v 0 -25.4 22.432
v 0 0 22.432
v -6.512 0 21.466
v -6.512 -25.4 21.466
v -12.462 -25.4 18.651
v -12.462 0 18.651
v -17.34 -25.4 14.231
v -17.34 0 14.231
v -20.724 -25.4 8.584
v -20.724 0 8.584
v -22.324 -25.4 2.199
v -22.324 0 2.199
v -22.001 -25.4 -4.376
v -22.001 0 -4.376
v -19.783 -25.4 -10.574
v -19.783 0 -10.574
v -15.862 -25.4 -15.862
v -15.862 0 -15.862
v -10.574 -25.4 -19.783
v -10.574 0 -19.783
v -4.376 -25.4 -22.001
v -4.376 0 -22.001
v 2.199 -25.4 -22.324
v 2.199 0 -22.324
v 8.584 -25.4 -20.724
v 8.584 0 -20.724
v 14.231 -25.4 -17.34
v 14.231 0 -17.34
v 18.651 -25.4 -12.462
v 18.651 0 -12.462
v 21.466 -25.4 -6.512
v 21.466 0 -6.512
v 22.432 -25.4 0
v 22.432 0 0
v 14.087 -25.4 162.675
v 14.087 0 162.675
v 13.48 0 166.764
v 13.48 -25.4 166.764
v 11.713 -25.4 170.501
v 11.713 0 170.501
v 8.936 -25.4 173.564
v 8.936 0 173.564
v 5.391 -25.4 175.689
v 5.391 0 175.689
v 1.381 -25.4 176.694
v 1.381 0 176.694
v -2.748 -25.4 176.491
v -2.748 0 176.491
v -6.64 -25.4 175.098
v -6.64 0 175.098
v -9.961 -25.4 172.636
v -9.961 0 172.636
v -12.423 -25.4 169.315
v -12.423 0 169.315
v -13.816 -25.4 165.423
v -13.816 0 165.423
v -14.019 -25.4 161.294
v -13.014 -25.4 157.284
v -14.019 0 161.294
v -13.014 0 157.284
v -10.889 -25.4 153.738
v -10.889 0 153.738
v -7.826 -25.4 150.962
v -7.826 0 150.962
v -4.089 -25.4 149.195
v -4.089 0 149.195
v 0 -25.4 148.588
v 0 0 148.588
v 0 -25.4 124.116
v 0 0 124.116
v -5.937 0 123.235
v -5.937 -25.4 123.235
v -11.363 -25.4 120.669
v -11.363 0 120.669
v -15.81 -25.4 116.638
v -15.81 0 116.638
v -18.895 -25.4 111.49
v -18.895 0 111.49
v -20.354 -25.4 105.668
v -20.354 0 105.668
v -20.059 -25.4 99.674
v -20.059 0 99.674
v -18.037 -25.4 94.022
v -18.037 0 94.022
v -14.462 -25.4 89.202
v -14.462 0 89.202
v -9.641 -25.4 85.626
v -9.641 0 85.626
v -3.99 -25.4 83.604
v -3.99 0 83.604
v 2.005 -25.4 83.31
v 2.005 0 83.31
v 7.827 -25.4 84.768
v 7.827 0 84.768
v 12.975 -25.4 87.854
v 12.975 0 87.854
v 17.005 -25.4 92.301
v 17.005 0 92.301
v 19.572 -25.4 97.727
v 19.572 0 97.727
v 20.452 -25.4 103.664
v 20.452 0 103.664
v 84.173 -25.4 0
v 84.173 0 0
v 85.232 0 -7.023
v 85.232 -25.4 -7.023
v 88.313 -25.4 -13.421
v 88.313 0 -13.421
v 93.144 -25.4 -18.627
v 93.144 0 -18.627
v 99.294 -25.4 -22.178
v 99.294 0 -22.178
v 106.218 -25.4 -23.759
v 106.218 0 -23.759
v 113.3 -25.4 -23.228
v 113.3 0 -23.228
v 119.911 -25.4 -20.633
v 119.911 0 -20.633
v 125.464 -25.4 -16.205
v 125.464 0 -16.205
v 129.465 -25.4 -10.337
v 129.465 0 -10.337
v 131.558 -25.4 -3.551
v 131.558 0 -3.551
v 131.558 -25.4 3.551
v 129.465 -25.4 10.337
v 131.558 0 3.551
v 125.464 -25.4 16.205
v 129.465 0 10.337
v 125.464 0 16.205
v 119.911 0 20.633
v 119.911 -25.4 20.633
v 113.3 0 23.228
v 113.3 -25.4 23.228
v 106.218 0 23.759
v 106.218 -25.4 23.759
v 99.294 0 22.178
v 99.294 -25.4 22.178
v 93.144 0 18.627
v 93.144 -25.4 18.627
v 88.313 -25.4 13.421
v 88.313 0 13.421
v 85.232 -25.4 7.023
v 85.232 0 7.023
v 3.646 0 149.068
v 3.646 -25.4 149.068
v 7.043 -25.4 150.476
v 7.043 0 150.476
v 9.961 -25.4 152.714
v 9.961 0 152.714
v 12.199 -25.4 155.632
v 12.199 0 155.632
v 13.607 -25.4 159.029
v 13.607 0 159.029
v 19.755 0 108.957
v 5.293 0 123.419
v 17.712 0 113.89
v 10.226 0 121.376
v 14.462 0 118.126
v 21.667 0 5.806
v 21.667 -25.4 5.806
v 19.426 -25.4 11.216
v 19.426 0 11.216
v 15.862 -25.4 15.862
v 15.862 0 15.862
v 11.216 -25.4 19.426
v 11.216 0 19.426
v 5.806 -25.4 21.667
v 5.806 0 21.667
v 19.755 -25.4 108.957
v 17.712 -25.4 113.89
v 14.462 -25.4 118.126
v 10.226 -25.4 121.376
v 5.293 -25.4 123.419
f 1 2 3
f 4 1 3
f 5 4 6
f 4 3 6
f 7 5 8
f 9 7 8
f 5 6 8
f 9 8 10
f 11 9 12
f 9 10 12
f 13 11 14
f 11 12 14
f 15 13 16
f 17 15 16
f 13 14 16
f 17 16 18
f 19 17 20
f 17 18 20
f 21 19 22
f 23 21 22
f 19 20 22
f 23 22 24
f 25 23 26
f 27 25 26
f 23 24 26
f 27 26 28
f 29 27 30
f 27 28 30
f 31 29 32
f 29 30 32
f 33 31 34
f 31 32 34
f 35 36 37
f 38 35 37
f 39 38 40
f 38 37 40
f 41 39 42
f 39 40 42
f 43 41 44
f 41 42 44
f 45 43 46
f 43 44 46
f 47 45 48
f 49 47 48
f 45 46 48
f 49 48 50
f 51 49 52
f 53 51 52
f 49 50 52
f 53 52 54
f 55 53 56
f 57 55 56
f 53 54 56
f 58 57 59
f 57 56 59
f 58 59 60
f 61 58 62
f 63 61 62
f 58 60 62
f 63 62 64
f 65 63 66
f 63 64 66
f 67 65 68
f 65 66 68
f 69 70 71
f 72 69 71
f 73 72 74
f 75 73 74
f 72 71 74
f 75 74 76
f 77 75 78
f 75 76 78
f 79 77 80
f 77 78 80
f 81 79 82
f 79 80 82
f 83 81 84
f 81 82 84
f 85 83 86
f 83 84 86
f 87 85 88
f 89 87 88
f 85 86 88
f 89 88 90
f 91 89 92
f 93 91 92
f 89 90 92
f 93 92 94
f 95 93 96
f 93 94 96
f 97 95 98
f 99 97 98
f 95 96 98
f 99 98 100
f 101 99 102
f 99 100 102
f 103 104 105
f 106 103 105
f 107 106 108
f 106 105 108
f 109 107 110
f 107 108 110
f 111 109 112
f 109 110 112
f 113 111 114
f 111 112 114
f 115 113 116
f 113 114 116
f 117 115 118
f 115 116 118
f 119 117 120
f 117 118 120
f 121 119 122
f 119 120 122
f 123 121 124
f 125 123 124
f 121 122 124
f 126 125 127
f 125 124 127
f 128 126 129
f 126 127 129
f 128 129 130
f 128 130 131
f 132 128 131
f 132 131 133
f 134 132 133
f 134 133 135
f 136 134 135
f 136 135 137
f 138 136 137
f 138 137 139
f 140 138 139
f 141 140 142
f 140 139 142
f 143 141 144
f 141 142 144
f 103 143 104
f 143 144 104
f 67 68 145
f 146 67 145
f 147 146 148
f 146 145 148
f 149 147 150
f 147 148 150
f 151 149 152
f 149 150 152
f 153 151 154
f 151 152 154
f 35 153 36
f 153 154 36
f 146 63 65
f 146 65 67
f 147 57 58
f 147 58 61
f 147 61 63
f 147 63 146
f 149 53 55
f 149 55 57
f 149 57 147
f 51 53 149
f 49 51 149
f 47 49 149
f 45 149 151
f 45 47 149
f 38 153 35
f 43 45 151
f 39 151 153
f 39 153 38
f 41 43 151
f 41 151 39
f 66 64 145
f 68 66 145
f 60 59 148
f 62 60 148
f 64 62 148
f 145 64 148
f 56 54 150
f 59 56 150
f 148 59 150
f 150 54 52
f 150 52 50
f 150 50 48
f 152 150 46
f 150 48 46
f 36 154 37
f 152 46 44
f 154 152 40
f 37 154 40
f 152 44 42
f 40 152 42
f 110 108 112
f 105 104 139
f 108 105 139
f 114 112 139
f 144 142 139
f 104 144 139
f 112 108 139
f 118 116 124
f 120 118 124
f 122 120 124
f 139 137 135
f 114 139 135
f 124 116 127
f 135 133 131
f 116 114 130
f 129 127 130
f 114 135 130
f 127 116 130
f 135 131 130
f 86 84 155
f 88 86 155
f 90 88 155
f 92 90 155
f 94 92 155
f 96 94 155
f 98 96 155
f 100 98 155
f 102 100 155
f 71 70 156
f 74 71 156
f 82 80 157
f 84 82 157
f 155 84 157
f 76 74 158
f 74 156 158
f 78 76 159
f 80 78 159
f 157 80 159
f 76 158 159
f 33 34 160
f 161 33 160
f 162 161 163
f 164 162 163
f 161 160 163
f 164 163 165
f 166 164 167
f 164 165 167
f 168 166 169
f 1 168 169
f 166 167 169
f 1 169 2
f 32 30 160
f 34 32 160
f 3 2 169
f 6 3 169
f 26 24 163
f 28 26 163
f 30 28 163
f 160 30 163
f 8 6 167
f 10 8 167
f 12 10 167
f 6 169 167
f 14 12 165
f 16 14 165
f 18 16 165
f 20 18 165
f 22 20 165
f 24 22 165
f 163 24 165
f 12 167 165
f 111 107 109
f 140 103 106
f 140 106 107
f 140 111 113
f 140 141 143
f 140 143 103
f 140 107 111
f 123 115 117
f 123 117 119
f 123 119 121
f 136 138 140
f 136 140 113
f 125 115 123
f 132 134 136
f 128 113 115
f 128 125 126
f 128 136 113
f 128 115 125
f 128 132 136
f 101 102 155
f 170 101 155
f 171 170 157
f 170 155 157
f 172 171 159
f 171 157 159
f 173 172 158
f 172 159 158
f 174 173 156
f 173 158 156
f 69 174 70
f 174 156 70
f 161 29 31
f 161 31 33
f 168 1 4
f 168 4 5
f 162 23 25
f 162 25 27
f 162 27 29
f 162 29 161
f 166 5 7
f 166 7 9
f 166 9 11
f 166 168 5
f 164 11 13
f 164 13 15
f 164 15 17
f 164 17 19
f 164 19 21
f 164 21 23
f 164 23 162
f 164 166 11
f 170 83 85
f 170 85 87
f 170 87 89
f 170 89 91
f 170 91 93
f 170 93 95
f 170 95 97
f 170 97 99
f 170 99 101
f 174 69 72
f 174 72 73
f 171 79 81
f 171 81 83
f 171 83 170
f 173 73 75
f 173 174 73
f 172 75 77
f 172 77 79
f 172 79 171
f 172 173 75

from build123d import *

# Parameters (mm, degrees)
F3_DEPTH = 25.4


# Not quite as in the source:
# - the program builds the solid bodies; features that only make, move or delete a surface that nothing else refers to are left out


with BuildPart() as f3:
    # F0 (on Front) → F3 (new body)
    with BuildSketch(Plane.XZ):
        with BuildLine():
            Line((22.4317827104, 0), (0, 0))
            Line((0, 0), (0, 22.4317827104))
            ThreePointArc((0, 22.4317827104), (-15.8616656686, -15.8616656686), (22.4317827104, 0))
        make_face()
        with BuildLine():
            Line((0, 22.4317827104), (0, 0))
            Line((0, 0), (22.4317827104, 0))
            ThreePointArc((22.4317827104, 0), (15.8616656686, 15.8616656686), (0, 22.4317827104))
        make_face()
    extrude(amount=F3_DEPTH)


with BuildPart() as f3b:
    # F0 (on Front) → F3, piece 2 (new body)
    with BuildSketch(Plane.XZ):
        with BuildLine():
            ThreePointArc((14.0866758828, 162.6749411225), (-9.9607840411, 172.6357251636), (0, 148.5882652397))
            ThreePointArc((0, 148.5882652397), (9.9607840411, 152.7141570814), (14.0866758828, 162.6749411225))
        make_face()
    extrude(amount=F3_DEPTH)


with BuildPart() as f3c:
    # F0 (on Front) → F3, piece 3 (new body)
    with BuildSketch(Plane.XZ):
        with BuildLine():
            ThreePointArc((0, 124.1158500545), (-20.4522788755, 103.6635711789), (0, 83.2112923034))
            Line((0, 83.2112923034), (0, 124.1158500545))
        make_face()
        with BuildLine():
            Line((0, 124.1158500545), (0, 83.2112923034))
            ThreePointArc((0, 83.2112923034), (14.4619450836, 89.2016260953), (20.4522788755, 103.6635711789))
            ThreePointArc((20.4522788755, 103.6635711789), (14.4619450836, 118.1255162625), (0, 124.1158500545))
        make_face()
    extrude(amount=F3_DEPTH)


with BuildPart() as f3d:
    # F0 (on Front) → F3, piece 4 (new body)
    with BuildSketch(Plane.XZ):
        with BuildLine():
            ThreePointArc((131.8241035994, 0), (107.9986616969, 23.8254419025), (84.1732197944, 0))
            ThreePointArc((84.1732197944, 0), (107.9986616969, -23.8254419025), (131.8241035994, 0))
        make_face()
    extrude(amount=F3_DEPTH)


solid = Compound([f3.part, f3b.part, f3c.part, f3d.part])
